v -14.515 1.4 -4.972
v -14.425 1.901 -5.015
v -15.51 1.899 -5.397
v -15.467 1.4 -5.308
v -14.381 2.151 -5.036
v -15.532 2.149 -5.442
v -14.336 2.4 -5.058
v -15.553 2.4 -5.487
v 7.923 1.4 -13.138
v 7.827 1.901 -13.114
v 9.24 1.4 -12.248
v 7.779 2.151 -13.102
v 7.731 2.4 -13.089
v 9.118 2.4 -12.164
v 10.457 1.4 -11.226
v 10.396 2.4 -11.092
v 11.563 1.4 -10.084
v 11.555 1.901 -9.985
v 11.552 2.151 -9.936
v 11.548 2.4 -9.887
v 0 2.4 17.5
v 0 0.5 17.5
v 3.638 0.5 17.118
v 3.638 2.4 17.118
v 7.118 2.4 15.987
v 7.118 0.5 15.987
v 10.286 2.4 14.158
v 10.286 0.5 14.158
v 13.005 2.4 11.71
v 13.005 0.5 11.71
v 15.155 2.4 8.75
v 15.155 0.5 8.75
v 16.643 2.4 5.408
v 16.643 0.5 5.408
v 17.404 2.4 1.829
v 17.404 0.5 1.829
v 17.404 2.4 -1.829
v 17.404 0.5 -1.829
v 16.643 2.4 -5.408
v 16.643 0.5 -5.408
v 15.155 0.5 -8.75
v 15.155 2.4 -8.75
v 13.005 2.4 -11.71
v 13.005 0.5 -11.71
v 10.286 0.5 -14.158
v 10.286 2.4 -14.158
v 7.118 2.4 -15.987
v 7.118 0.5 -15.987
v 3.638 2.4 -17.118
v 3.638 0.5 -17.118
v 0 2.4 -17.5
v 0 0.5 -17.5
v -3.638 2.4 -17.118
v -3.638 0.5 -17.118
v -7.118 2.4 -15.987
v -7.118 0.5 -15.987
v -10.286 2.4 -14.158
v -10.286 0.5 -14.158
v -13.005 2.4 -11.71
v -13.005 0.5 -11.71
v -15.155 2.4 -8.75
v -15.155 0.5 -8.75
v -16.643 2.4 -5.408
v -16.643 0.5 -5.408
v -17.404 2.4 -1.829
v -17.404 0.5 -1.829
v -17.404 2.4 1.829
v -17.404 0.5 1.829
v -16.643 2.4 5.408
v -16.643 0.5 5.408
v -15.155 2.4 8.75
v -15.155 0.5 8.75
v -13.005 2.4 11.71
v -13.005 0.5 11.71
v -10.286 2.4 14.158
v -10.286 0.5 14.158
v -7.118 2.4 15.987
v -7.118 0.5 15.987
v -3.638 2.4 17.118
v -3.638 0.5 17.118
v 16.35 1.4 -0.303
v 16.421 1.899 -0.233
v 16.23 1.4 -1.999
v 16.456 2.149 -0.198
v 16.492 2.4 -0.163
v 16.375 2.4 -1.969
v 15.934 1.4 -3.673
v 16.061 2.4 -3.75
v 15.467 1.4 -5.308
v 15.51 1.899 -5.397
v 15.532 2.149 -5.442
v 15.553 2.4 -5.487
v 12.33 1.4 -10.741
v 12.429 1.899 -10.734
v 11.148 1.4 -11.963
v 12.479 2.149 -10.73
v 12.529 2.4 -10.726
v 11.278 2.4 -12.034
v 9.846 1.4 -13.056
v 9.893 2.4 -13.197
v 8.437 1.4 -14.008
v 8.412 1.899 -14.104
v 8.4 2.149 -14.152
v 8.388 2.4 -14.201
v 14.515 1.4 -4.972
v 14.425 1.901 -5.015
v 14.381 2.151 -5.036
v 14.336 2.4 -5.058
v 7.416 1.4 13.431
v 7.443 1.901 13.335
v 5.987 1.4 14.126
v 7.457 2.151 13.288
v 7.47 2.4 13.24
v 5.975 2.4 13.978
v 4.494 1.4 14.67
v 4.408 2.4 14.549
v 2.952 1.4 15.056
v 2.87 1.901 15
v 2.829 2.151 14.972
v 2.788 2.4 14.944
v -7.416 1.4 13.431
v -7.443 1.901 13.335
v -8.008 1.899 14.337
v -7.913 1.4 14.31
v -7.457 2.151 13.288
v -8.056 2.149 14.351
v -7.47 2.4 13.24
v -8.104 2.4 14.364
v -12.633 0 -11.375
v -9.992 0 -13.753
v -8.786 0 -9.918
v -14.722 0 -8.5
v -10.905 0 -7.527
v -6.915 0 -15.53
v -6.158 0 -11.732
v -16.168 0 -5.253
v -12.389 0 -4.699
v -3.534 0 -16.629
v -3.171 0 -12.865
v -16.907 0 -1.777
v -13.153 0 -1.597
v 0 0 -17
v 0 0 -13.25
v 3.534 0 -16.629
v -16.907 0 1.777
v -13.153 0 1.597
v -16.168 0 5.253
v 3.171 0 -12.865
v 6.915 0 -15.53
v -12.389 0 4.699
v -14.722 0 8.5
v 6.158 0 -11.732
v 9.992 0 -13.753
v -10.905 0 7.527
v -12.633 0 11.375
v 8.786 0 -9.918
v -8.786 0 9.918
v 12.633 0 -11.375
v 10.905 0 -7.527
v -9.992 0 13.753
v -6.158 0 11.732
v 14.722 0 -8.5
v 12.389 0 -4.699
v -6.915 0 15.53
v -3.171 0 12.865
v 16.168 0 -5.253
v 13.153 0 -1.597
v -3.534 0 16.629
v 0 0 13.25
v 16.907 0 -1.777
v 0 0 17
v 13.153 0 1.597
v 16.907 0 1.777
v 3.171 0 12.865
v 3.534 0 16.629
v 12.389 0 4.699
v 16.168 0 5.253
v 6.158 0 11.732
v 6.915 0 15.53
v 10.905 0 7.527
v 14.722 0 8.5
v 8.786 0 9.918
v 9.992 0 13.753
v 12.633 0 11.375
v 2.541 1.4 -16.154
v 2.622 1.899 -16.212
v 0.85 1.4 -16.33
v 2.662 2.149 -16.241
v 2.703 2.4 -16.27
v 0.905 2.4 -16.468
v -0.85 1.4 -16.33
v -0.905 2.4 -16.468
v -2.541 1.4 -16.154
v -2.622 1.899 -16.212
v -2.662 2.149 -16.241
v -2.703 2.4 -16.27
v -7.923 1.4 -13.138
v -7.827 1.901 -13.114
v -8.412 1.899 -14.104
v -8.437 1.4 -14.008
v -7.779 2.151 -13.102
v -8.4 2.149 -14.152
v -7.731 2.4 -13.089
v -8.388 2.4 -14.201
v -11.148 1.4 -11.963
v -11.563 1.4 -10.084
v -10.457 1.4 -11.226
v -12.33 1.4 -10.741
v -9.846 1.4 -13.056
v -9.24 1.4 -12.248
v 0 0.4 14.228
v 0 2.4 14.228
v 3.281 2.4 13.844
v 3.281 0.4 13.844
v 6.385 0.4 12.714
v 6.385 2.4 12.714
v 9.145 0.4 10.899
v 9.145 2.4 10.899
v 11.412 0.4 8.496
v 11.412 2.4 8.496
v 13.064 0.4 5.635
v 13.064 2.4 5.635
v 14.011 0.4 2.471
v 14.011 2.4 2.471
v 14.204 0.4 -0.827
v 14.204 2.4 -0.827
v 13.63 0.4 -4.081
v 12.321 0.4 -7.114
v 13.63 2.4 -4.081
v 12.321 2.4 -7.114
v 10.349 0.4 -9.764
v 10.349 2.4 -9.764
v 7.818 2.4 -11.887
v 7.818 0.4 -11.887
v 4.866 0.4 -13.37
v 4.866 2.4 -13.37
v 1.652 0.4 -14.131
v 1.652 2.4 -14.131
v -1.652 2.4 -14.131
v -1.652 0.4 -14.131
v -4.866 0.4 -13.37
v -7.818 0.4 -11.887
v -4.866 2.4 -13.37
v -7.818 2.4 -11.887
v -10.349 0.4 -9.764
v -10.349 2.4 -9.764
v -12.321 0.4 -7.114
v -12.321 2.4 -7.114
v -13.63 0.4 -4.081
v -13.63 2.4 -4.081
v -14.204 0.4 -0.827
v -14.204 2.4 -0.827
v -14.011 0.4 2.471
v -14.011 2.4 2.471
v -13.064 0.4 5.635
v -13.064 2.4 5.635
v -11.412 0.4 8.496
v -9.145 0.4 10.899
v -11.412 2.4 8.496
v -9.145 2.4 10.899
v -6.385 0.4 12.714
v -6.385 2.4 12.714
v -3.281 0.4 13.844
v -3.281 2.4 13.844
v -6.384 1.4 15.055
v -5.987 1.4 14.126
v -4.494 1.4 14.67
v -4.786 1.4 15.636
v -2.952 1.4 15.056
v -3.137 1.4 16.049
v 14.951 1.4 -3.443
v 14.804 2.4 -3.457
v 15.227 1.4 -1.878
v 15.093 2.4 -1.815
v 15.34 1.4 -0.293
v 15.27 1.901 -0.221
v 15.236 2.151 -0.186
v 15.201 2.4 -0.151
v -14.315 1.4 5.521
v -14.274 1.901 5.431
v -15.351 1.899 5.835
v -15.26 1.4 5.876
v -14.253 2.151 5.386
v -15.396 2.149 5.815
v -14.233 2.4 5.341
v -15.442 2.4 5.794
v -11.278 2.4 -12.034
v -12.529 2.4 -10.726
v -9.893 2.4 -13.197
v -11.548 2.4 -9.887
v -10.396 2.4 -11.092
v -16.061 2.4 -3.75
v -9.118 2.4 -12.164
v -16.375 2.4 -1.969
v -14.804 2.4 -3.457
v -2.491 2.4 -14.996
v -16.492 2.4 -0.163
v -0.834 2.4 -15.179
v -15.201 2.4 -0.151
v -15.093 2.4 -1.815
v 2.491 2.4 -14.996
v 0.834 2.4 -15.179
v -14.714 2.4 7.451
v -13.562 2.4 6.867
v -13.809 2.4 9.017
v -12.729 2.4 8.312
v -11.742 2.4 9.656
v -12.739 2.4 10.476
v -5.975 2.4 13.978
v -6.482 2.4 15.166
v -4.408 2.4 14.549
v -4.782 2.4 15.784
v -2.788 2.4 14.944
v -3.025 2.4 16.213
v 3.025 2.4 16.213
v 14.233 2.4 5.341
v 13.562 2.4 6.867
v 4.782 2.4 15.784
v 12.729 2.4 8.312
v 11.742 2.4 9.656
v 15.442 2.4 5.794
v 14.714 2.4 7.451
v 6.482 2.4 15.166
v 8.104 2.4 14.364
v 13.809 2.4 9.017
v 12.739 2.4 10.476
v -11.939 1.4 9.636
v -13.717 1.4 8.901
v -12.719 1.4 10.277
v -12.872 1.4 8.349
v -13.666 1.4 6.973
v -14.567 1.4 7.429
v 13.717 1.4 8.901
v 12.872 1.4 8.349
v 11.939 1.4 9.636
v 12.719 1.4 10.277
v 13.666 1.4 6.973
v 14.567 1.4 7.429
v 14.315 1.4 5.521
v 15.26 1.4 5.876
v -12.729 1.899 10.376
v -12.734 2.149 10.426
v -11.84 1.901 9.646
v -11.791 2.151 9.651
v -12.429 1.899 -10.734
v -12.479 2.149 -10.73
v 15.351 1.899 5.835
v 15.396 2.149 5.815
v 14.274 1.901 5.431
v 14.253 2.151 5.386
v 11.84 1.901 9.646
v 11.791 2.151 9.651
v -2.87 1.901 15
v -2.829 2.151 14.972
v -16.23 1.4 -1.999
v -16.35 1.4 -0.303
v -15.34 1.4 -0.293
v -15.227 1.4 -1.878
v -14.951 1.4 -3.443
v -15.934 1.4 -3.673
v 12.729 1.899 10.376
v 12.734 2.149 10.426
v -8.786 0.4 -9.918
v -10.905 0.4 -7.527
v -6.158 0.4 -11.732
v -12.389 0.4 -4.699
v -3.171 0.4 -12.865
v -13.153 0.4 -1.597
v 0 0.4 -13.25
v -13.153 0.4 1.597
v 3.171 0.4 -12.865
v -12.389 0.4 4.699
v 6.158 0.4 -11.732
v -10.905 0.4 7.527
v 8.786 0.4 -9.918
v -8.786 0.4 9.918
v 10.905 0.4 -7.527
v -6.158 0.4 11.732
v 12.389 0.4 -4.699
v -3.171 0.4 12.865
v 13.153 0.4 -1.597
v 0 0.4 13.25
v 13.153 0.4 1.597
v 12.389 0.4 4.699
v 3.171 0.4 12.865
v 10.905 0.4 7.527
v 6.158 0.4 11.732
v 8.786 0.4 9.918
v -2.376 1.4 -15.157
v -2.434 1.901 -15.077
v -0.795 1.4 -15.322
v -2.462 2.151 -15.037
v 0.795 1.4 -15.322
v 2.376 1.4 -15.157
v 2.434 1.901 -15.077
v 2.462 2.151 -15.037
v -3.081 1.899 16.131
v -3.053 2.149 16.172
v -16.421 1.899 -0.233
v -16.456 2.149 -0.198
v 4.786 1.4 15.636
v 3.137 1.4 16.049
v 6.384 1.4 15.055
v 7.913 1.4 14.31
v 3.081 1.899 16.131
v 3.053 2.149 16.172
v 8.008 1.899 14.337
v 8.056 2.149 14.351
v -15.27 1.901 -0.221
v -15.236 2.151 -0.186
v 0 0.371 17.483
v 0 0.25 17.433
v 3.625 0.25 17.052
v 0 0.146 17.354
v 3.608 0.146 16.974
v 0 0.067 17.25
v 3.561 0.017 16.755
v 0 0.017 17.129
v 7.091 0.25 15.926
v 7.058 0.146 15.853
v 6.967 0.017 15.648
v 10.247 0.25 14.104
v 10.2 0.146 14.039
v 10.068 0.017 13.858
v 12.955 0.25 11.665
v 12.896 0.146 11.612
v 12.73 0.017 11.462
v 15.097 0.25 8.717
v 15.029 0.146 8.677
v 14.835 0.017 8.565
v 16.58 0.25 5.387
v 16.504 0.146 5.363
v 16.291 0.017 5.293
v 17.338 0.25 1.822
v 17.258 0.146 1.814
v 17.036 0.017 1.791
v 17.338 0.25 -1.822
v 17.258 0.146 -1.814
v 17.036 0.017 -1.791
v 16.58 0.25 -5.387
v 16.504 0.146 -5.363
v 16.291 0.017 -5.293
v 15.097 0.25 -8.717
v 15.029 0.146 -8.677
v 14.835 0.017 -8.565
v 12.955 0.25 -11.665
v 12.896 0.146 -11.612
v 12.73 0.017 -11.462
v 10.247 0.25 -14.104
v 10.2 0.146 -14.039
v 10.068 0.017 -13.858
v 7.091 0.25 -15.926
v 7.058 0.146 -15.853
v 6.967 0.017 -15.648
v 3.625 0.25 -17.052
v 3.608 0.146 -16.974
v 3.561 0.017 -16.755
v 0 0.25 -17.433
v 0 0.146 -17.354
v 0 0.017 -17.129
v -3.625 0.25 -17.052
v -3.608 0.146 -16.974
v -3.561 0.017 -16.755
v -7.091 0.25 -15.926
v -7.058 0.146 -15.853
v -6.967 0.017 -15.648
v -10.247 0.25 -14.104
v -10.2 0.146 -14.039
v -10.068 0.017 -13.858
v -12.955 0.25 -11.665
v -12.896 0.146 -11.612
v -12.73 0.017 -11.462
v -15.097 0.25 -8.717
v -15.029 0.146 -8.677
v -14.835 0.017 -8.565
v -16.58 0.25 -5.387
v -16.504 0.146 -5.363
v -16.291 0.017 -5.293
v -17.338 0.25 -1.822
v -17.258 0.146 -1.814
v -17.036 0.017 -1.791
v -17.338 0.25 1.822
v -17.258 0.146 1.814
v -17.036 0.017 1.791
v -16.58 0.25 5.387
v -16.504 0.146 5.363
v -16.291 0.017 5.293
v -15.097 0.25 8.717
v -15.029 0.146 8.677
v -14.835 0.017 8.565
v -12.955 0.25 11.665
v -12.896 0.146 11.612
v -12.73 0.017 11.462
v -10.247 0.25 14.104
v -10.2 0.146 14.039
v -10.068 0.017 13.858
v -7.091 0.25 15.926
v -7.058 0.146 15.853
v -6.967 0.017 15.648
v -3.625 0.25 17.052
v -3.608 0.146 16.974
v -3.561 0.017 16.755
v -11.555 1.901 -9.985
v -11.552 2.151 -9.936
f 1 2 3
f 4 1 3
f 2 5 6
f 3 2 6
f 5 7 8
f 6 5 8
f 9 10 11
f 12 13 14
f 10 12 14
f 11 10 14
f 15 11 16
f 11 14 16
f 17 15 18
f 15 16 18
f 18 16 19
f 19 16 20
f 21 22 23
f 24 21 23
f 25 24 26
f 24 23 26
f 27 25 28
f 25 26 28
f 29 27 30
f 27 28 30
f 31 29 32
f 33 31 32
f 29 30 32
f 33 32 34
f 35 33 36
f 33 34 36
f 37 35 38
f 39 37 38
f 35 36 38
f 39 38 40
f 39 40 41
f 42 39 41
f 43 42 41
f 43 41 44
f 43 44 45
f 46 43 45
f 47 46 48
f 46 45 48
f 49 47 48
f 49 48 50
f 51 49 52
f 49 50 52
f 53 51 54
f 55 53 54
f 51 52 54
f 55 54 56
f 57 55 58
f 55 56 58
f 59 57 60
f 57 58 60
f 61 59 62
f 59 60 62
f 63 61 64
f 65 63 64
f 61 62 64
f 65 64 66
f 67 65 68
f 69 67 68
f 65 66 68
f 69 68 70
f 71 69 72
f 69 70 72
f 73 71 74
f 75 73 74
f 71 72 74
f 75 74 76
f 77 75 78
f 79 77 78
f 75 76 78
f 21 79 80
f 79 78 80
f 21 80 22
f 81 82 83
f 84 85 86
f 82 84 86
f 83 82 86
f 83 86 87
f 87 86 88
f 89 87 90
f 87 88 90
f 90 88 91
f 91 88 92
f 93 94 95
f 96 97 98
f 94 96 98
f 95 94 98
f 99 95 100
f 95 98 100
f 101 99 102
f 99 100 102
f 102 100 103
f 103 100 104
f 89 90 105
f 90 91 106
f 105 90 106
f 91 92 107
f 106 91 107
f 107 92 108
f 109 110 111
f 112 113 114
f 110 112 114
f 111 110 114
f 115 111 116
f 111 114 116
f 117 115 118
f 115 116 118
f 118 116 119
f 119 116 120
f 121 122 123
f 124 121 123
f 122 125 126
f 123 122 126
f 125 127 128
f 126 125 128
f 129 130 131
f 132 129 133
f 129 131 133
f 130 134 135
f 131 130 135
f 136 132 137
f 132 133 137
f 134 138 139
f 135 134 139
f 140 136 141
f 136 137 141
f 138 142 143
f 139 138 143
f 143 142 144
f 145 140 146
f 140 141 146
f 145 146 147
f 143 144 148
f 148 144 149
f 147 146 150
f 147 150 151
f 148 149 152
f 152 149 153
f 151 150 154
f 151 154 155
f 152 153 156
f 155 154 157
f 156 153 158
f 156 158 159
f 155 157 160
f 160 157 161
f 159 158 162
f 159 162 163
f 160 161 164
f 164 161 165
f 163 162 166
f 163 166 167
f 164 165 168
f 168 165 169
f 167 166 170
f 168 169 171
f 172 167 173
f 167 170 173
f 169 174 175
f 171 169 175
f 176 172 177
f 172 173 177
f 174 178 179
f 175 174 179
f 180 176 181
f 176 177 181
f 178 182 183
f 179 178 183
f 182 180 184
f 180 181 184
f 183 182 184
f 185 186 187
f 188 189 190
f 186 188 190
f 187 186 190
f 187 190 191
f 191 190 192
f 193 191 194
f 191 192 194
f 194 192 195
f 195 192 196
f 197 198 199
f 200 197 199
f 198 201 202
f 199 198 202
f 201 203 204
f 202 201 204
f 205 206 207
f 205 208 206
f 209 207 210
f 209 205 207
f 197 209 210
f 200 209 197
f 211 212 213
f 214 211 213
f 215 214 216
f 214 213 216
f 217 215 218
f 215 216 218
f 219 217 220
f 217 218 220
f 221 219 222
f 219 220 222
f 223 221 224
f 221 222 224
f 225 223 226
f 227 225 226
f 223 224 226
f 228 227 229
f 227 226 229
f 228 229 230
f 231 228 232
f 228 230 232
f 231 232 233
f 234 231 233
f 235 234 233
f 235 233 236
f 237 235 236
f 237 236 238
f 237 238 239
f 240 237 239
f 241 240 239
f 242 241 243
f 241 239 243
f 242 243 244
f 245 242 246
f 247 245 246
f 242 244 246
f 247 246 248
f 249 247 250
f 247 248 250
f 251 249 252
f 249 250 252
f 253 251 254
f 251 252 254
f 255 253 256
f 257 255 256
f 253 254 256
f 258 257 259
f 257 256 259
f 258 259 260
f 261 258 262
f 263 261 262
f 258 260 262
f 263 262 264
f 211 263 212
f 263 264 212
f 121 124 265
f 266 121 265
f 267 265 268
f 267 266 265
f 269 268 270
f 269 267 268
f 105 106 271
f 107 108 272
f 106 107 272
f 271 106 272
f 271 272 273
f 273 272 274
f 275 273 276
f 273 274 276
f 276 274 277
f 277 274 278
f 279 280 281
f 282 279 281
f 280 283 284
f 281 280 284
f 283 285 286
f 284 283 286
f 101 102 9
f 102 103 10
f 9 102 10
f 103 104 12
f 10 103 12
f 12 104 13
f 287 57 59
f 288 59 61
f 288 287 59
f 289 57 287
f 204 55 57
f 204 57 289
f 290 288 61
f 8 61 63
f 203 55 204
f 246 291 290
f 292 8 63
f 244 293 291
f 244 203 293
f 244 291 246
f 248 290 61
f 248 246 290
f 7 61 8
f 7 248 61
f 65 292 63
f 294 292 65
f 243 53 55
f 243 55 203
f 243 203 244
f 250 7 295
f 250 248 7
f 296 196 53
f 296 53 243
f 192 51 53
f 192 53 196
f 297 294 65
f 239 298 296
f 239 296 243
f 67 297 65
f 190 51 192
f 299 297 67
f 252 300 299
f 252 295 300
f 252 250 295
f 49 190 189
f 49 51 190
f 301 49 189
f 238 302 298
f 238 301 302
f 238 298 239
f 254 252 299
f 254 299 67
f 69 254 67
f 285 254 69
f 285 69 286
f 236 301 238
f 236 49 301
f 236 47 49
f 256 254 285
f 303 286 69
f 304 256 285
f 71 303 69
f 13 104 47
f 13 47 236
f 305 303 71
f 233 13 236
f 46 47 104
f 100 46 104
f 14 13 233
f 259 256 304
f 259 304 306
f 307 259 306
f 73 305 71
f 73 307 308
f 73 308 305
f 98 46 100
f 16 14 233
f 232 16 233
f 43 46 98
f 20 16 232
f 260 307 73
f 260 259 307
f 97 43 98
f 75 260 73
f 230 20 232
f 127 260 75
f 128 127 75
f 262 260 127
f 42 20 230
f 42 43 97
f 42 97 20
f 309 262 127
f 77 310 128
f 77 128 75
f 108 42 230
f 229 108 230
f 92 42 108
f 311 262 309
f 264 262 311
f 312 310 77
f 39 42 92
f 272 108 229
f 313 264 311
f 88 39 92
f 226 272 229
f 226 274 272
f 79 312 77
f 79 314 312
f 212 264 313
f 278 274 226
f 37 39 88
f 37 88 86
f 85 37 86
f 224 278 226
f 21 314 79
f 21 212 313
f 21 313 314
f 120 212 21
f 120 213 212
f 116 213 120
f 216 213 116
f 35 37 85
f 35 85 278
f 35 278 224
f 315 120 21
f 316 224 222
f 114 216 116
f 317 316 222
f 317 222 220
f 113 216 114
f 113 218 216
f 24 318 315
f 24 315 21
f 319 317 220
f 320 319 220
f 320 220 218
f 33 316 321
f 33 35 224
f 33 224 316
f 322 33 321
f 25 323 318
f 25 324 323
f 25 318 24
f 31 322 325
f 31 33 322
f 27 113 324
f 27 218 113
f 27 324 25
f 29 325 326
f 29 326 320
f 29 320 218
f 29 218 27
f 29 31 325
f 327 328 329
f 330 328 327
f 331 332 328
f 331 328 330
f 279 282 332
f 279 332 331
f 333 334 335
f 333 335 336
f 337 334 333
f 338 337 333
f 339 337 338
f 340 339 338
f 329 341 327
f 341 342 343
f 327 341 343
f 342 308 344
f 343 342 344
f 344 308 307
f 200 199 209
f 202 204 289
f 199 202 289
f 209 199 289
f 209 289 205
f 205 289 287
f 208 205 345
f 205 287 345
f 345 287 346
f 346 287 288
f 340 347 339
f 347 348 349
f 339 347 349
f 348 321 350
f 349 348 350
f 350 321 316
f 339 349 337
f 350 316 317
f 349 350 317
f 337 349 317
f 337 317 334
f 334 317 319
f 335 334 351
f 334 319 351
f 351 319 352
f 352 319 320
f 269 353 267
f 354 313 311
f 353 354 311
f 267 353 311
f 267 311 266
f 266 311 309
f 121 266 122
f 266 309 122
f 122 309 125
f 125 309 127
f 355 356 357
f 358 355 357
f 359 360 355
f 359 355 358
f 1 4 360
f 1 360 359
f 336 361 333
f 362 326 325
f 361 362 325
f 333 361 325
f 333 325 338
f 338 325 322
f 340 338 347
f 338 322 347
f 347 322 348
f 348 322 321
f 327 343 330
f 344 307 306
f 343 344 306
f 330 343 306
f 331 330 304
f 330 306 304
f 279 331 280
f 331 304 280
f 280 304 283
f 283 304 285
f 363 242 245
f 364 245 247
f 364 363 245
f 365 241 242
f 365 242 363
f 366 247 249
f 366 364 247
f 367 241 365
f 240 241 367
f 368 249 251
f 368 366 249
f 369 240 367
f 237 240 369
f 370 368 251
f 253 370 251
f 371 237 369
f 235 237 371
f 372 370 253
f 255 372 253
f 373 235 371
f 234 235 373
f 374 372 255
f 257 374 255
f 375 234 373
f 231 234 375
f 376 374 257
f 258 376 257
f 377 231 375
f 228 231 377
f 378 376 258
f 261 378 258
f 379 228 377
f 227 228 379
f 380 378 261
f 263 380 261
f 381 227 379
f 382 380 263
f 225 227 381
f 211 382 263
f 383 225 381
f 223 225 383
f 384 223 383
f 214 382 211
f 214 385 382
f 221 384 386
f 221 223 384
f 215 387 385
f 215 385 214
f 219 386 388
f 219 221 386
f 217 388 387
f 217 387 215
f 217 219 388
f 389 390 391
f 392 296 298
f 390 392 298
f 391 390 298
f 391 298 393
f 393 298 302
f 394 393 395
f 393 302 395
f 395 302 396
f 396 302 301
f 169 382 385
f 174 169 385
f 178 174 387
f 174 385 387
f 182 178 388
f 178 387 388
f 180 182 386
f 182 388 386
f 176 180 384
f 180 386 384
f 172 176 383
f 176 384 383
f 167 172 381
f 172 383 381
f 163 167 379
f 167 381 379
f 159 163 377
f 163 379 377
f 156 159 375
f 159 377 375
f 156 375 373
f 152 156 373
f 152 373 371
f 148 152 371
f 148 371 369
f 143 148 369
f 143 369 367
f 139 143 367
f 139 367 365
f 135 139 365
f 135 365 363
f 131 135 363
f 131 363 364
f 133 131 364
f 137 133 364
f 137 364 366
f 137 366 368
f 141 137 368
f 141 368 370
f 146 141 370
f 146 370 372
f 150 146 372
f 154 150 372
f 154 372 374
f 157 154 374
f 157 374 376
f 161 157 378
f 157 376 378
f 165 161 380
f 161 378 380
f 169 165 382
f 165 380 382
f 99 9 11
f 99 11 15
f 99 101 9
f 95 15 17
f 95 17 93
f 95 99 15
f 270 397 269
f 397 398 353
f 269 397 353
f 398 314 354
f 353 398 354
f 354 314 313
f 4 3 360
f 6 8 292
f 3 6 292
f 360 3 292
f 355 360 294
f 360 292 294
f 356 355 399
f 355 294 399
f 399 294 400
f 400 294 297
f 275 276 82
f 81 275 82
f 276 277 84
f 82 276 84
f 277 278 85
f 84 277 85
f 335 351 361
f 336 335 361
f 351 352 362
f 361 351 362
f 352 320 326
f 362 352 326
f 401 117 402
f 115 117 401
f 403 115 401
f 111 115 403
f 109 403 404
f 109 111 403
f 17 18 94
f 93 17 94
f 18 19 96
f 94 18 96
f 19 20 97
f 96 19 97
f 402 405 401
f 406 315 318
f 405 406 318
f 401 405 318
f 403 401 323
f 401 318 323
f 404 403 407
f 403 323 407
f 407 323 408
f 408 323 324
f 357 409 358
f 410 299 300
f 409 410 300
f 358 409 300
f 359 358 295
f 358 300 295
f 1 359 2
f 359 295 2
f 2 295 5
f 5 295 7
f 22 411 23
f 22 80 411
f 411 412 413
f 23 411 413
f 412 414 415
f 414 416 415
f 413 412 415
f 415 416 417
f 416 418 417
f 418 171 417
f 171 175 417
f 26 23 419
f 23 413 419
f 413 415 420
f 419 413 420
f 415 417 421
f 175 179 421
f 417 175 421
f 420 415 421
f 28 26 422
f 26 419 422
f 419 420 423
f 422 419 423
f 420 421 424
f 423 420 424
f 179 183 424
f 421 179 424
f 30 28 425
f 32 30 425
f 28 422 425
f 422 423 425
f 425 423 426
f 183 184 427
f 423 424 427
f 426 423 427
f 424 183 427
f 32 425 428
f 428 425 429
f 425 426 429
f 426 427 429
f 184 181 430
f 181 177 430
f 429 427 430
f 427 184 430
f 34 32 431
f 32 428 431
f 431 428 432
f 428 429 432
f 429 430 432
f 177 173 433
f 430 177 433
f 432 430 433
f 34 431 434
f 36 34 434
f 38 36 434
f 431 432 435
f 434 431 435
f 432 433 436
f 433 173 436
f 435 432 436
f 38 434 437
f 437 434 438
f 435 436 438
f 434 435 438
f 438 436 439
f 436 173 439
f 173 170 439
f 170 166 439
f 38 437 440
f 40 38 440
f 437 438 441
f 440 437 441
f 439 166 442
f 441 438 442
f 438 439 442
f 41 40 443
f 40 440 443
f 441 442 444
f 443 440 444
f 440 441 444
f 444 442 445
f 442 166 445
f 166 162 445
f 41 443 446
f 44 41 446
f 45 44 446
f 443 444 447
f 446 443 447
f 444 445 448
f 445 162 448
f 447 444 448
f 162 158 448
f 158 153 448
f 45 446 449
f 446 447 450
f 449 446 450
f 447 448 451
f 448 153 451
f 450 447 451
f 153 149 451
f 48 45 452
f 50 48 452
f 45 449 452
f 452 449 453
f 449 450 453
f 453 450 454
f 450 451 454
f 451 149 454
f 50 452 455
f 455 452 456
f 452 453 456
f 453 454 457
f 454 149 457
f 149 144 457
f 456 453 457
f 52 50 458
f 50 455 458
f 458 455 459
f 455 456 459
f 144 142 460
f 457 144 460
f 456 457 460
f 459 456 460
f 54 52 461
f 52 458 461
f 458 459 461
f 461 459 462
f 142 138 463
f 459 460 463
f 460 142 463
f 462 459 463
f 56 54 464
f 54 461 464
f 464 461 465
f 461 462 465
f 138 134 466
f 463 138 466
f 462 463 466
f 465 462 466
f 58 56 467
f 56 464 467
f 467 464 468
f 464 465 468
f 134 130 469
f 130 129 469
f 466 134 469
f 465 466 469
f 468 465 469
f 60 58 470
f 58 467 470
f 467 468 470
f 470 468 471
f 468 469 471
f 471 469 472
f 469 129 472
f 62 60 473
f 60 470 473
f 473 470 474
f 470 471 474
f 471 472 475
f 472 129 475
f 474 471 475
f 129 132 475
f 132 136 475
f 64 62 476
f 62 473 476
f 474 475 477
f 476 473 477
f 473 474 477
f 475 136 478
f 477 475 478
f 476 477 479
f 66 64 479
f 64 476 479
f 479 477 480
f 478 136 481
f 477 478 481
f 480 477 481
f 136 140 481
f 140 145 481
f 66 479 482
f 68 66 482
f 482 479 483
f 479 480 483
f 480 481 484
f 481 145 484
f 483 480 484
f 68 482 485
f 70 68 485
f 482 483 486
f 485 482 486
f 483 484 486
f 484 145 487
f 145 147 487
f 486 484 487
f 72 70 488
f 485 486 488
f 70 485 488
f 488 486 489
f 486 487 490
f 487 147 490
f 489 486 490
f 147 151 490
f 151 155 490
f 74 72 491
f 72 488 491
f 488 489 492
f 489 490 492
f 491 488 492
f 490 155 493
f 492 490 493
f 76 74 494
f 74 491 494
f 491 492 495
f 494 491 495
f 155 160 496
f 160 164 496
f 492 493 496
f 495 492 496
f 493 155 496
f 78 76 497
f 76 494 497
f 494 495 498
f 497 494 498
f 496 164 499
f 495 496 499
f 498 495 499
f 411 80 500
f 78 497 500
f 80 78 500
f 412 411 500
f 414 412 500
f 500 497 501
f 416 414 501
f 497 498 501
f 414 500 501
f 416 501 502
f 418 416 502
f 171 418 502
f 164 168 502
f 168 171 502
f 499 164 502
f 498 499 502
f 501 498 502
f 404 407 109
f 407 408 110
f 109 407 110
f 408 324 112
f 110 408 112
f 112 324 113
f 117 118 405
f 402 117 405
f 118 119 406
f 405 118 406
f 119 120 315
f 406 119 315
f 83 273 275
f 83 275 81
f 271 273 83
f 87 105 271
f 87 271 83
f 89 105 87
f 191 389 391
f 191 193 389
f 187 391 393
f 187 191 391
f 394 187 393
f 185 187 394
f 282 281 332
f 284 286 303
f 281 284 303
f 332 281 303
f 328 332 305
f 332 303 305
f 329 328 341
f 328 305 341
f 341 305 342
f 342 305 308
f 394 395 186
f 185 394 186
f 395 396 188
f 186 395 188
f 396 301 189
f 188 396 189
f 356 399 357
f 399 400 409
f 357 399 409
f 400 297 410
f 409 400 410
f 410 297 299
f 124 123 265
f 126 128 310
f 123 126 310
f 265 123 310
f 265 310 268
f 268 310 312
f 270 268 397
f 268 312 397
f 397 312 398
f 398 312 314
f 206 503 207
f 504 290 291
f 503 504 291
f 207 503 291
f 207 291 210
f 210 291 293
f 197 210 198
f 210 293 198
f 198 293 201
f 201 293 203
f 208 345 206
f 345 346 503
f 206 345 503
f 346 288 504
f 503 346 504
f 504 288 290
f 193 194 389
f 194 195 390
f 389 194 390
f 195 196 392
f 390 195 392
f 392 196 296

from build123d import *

# Parameters (mm, degrees)
SKETCH_1_R                    = 17.5
SKETCH_1_R_2                  = 13
EXTRUDE_1_DEPTH               = 2.4
SKETCH_2_R                    = 14.227604949
CUT_EXTRUDE_1_DEPTH           = 2
SKETCH_3_R                    = 13.25
CUT_EXTRUDE_2_DEPTH           = 2
CUT_EXTRUDE_3_DEPTH           = 1
CUT_EXTRUDE_3_DRAFT           = -8
CUT_EXTRUDE_3_PROFILE_2_DEPTH = 1
CUT_EXTRUDE_3_PROFILE_2_DRAFT = -8
CUT_EXTRUDE_3_PROFILE_3_DEPTH = 1
CUT_EXTRUDE_3_PROFILE_3_DRAFT = -8
CUT_EXTRUDE_3_PROFILE_4_DEPTH = 1
CUT_EXTRUDE_3_PROFILE_4_DRAFT = -8
CUT_EXTRUDE_3_PROFILE_5_DEPTH = 1
CUT_EXTRUDE_3_PROFILE_5_DRAFT = -8
CUT_EXTRUDE_3_PROFILE_6_DEPTH = 1
CUT_EXTRUDE_3_PROFILE_6_DRAFT = -8
CUT_EXTRUDE_3_PROFILE_7_DEPTH = 1
CUT_EXTRUDE_3_PROFILE_7_DRAFT = -8
CUT_EXTRUDE_3_PROFILE_8_DEPTH = 1
CUT_EXTRUDE_3_PROFILE_8_DRAFT = -8
CUT_EXTRUDE_3_PROFILE_9_DEPTH = 1
CUT_EXTRUDE_3_PROFILE_9_DRAFT = -8
FILLET_1_R                    = 0.5


with BuildPart() as part:
    # 草图1 → 凸台-拉伸1 (new body)
    with BuildSketch(Plane(origin=(0, 0, 0), x_dir=(1, 0, 0), z_dir=(0, 1, 0))):
        with Locations(Location((0, 0, 0), (0, 0, 270))):
            Circle(SKETCH_1_R)
        with Locations(Location((0, 0, 0), (0, 0, 270))):
            Circle(SKETCH_1_R_2, mode=Mode.SUBTRACT)
    extrude(amount=EXTRUDE_1_DEPTH)

    # 草图2 → 切除-拉伸1 (cut)
    with BuildSketch(Plane(origin=(0, 2.4, 0), x_dir=(1, 0, 0), z_dir=(0, 1, 0))):
        with Locations(Location((0, 0, 0), (0, 0, 270))):
            Circle(SKETCH_2_R)
    extrude(amount=-CUT_EXTRUDE_1_DEPTH, mode=Mode.SUBTRACT)

    # 草图3 → 切除-拉伸2 (cut)
    with BuildSketch(Plane(origin=(0, 0.4, 0), x_dir=(1, 0, 0), z_dir=(0, 1, 0))):
        with Locations(Location((0, 0, 0), (0, 0, 270))):
            Circle(SKETCH_3_R)
    extrude(amount=-CUT_EXTRUDE_2_DEPTH, mode=Mode.SUBTRACT)


with BuildPart() as cut_extrude_3_tool:
    # 草图4 → 切除-拉伸3 (with draft: the straight prism first)
    with BuildSketch(Plane(origin=(0, 2.4, 0), x_dir=(1, 0, 0), z_dir=(0, 1, 0))):
        with BuildLine():
            ThreePointArc((-2.491276454, 14.996396377), (0, 15.201919703), (2.491276454, 14.996396377))
            Line((2.491276454, 14.996396377), (2.702833077, 16.269874865))
            ThreePointArc((2.702833077, 16.269874865), (0, 16.49285102), (-2.702833077, 16.269874865))
            Line((-2.702833077, 16.269874865), (-2.491276454, 14.996396377))
        make_face()
    extrude(amount=-CUT_EXTRUDE_3_DEPTH)
    # 切除-拉伸3: the draft: its side faces are tilted about the plane it starts from
    cut_extrude_3_sides = [cut_extrude_3_tool.faces().sort_by_distance(p)[0] for p in [
        (0, 1.9, -16.49285102),
        (-2.597054766, 1.9, -15.633135621),
        (0, 1.9, -15.201919703),
        (2.597054766, 1.9, -15.633135621),
    ]]
    draft(cut_extrude_3_sides, Plane(origin=(0, 2.4, 0), x_dir=(1, 0, 0), z_dir=(0, 1, 0)), CUT_EXTRUDE_3_DRAFT)


with BuildPart() as part_1:
    add(part.part)

    # 切除-拉伸3: cut by cut_extrude_3_tool
    add(cut_extrude_3_tool.part, mode=Mode.SUBTRACT)


with BuildPart() as cut_extrude_3_profile_2_tool:
    # 草图4 → 切除-拉伸3 profile 2 (with draft: the straight prism first)
    with BuildSketch(Plane(origin=(0, 2.4, 0), x_dir=(1, 0, 0), z_dir=(0, 1, 0))):
        with BuildLine():
            ThreePointArc((7.731069297, 13.089267749), (9.771605629, 11.645346113), (11.547926265, 9.886544474))
            Line((11.547926265, 9.886544474), (12.528564234, 10.726099617))
            ThreePointArc((12.528564234, 10.726099617), (10.601400284, 12.634256875), (8.387583715, 14.200794844))
            Line((8.387583715, 14.200794844), (7.731069297, 13.089267749))
        make_face()
    extrude(amount=-CUT_EXTRUDE_3_PROFILE_2_DEPTH)
    # 切除-拉伸3 profile 2: the draft: its side faces are tilted about the plane it starts from
    cut_extrude_3_profile_2_sides = [cut_extrude_3_profile_2_tool.faces().sort_by_distance(p)[0] for p in [
        (8.059326506, 1.9, -13.645031296),
        (9.771605629, 1.9, -11.645346113),
        (12.03824525, 1.9, -10.306322046),
        (10.601400284, 1.9, -12.634256875),
    ]]
    draft(cut_extrude_3_profile_2_sides, Plane(origin=(0, 2.4, 0), x_dir=(1, 0, 0), z_dir=(0, 1, 0)), CUT_EXTRUDE_3_PROFILE_2_DRAFT)


with BuildPart() as part_2:
    add(part_1.part)

    # 切除-拉伸3 profile 2: cut by cut_extrude_3_profile_2_tool
    add(cut_extrude_3_profile_2_tool.part, mode=Mode.SUBTRACT)


with BuildPart() as cut_extrude_3_profile_3_tool:
    # 草图4 → 切除-拉伸3 profile 3 (with draft: the straight prism first)
    with BuildSketch(Plane(origin=(0, 2.4, 0), x_dir=(1, 0, 0), z_dir=(0, 1, 0))):
        with BuildLine():
            ThreePointArc((14.335961803, 5.05752527), (14.970968385, 2.639785654), (15.201173036, 0.150668535))
            Line((15.201173036, 0.150668535), (16.492040946, 0.163463152))
            ThreePointArc((16.492040946, 0.163463152), (16.242287554, 2.863953524), (15.553356869, 5.487005091))
            Line((15.553356869, 5.487005091), (14.335961803, 5.05752527))
        make_face()
    extrude(amount=-CUT_EXTRUDE_3_PROFILE_3_DEPTH)
    # 切除-拉伸3 profile 3: the draft: its side faces are tilted about the plane it starts from
    cut_extrude_3_profile_3_sides = [cut_extrude_3_profile_3_tool.faces().sort_by_distance(p)[0] for p in [
        (14.970968385, 1.9, -2.639785654),
        (15.846606991, 1.9, -0.157065843),
        (16.242287554, 1.9, -2.863953524),
        (14.944659336, 1.9, -5.27226518),
    ]]
    draft(cut_extrude_3_profile_3_sides, Plane(origin=(0, 2.4, 0), x_dir=(1, 0, 0), z_dir=(0, 1, 0)), CUT_EXTRUDE_3_PROFILE_3_DRAFT)


with BuildPart() as part_3:
    add(part_2.part)

    # 切除-拉伸3 profile 3: cut by cut_extrude_3_profile_3_tool
    add(cut_extrude_3_profile_3_tool.part, mode=Mode.SUBTRACT)


with BuildPart() as cut_extrude_3_profile_4_tool:
    # 草图4 → 切除-拉伸3 profile 4 (with draft: the straight prism first)
    with BuildSketch(Plane(origin=(0, 2.4, 0), x_dir=(1, 0, 0), z_dir=(0, 1, 0))):
        with BuildLine():
            ThreePointArc((14.232898455, -5.340689491), (13.165248649, -7.600959852), (11.741622, -9.655706886))
            Line((11.741622, -9.655706886), (12.738708411, -10.47565954))
            ThreePointArc((12.738708411, -10.47565954), (14.283227964, -8.24642551), (15.441541488, -5.794215325))
            Line((15.441541488, -5.794215325), (14.232898455, -5.340689491))
        make_face()
    extrude(amount=-CUT_EXTRUDE_3_PROFILE_4_DEPTH)
    # 切除-拉伸3 profile 4: the draft: its side faces are tilted about the plane it starts from
    cut_extrude_3_profile_4_sides = [cut_extrude_3_profile_4_tool.faces().sort_by_distance(p)[0] for p in [
        (12.240165206, 1.9, 10.065683213),
        (14.283227964, 1.9, 8.24642551),
        (14.837219972, 1.9, 5.567452408),
        (13.165248649, 1.9, 7.600959852),
    ]]
    draft(cut_extrude_3_profile_4_sides, Plane(origin=(0, 2.4, 0), x_dir=(1, 0, 0), z_dir=(0, 1, 0)), CUT_EXTRUDE_3_PROFILE_4_DRAFT)


with BuildPart() as part_4:
    add(part_3.part)

    # 切除-拉伸3 profile 4: cut by cut_extrude_3_profile_4_tool
    add(cut_extrude_3_profile_4_tool.part, mode=Mode.SUBTRACT)


with BuildPart() as cut_extrude_3_profile_5_tool:
    # 草图4 → 切除-拉伸3 profile 5 (with draft: the straight prism first)
    with BuildSketch(Plane(origin=(0, 2.4, 0), x_dir=(1, 0, 0), z_dir=(0, 1, 0))):
        with BuildLine():
            ThreePointArc((7.470103739, -13.239936284), (5.199362756, -14.285131767), (2.788035538, -14.944069744))
            Line((2.788035538, -14.944069744), (3.024792635, -16.213104708))
            ThreePointArc((3.024792635, -16.213104708), (5.64088727, -15.498210399), (8.104457231, -14.364257995))
            Line((8.104457231, -14.364257995), (7.470103739, -13.239936284))
        make_face()
    extrude(amount=-CUT_EXTRUDE_3_PROFILE_5_DEPTH)
    # 切除-拉伸3 profile 5: the draft: its side faces are tilted about the plane it starts from
    cut_extrude_3_profile_5_sides = [cut_extrude_3_profile_5_tool.faces().sort_by_distance(p)[0] for p in [
        (5.199362756, 1.9, 14.285131767),
        (2.906414086, 1.9, 15.578587226),
        (5.64088727, 1.9, 15.498210399),
        (7.787280485, 1.9, 13.80209714),
    ]]
    draft(cut_extrude_3_profile_5_sides, Plane(origin=(0, 2.4, 0), x_dir=(1, 0, 0), z_dir=(0, 1, 0)), CUT_EXTRUDE_3_PROFILE_5_DRAFT)


with BuildPart() as part_5:
    add(part_4.part)

    # 切除-拉伸3 profile 5: cut by cut_extrude_3_profile_5_tool
    add(cut_extrude_3_profile_5_tool.part, mode=Mode.SUBTRACT)


with BuildPart() as cut_extrude_3_profile_6_tool:
    # 草图4 → 切除-拉伸3 profile 6 (with draft: the straight prism first)
    with BuildSketch(Plane(origin=(0, 2.4, 0), x_dir=(1, 0, 0), z_dir=(0, 1, 0))):
        with BuildLine():
            ThreePointArc((-2.788035538, -14.944069744), (-5.199362756, -14.285131767), (-7.470103739, -13.239936284))
            Line((-7.470103739, -13.239936284), (-8.104457231, -14.364257995))
            ThreePointArc((-8.104457231, -14.364257995), (-5.64088727, -15.498210399), (-3.024792635, -16.213104708))
            Line((-3.024792635, -16.213104708), (-2.788035538, -14.944069744))
        make_face()
    extrude(amount=-CUT_EXTRUDE_3_PROFILE_6_DEPTH)
    # 切除-拉伸3 profile 6: the draft: its side faces are tilted about the plane it starts from
    cut_extrude_3_profile_6_sides = [cut_extrude_3_profile_6_tool.faces().sort_by_distance(p)[0] for p in [
        (-5.64088727, 1.9, 15.498210399),
        (-2.906414086, 1.9, 15.578587226),
        (-5.199362756, 1.9, 14.285131767),
        (-7.787280485, 1.9, 13.80209714),
    ]]
    draft(cut_extrude_3_profile_6_sides, Plane(origin=(0, 2.4, 0), x_dir=(1, 0, 0), z_dir=(0, 1, 0)), CUT_EXTRUDE_3_PROFILE_6_DRAFT)


with BuildPart() as part_6:
    add(part_5.part)

    # 切除-拉伸3 profile 6: cut by cut_extrude_3_profile_6_tool
    add(cut_extrude_3_profile_6_tool.part, mode=Mode.SUBTRACT)


with BuildPart() as cut_extrude_3_profile_7_tool:
    # 草图4 → 切除-拉伸3 profile 7 (with draft: the straight prism first)
    with BuildSketch(Plane(origin=(0, 2.4, 0), x_dir=(1, 0, 0), z_dir=(0, 1, 0))):
        with BuildLine():
            ThreePointArc((-11.741622, -9.655706886), (-13.165248649, -7.600959852), (-14.232898455, -5.340689491))
            Line((-14.232898455, -5.340689491), (-15.441541488, -5.794215325))
            ThreePointArc((-15.441541488, -5.794215325), (-14.283227964, -8.24642551), (-12.738708411, -10.47565954))
            Line((-12.738708411, -10.47565954), (-11.741622, -9.655706886))
        make_face()
    extrude(amount=-CUT_EXTRUDE_3_PROFILE_7_DEPTH)
    # 切除-拉伸3 profile 7: the draft: its side faces are tilted about the plane it starts from
    cut_extrude_3_profile_7_sides = [cut_extrude_3_profile_7_tool.faces().sort_by_distance(p)[0] for p in [
        (-12.240165206, 1.9, 10.065683213),
        (-13.165248649, 1.9, 7.600959852),
        (-14.837219972, 1.9, 5.567452408),
        (-14.283227964, 1.9, 8.24642551),
    ]]
    draft(cut_extrude_3_profile_7_sides, Plane(origin=(0, 2.4, 0), x_dir=(1, 0, 0), z_dir=(0, 1, 0)), CUT_EXTRUDE_3_PROFILE_7_DRAFT)


with BuildPart() as part_7:
    add(part_6.part)

    # 切除-拉伸3 profile 7: cut by cut_extrude_3_profile_7_tool
    add(cut_extrude_3_profile_7_tool.part, mode=Mode.SUBTRACT)


with BuildPart() as cut_extrude_3_profile_8_tool:
    # 草图4 → 切除-拉伸3 profile 8 (with draft: the straight prism first)
    with BuildSketch(Plane(origin=(0, 2.4, 0), x_dir=(1, 0, 0), z_dir=(0, 1, 0))):
        with BuildLine():
            ThreePointArc((-15.201173036, 0.150668535), (-14.970968385, 2.639785654), (-14.335961803, 5.05752527))
            Line((-14.335961803, 5.05752527), (-15.553356869, 5.487005091))
            ThreePointArc((-15.553356869, 5.487005091), (-16.242287554, 2.863953524), (-16.492040946, 0.163463152))
            Line((-16.492040946, 0.163463152), (-15.201173036, 0.150668535))
        make_face()
    extrude(amount=-CUT_EXTRUDE_3_PROFILE_8_DEPTH)
    # 切除-拉伸3 profile 8: the draft: its side faces are tilted about the plane it starts from
    cut_extrude_3_profile_8_sides = [cut_extrude_3_profile_8_tool.faces().sort_by_distance(p)[0] for p in [
        (-14.944659336, 1.9, -5.27226518),
        (-16.242287554, 1.9, -2.863953524),
        (-15.846606991, 1.9, -0.157065843),
        (-14.970968385, 1.9, -2.639785654),
    ]]
    draft(cut_extrude_3_profile_8_sides, Plane(origin=(0, 2.4, 0), x_dir=(1, 0, 0), z_dir=(0, 1, 0)), CUT_EXTRUDE_3_PROFILE_8_DRAFT)


with BuildPart() as part_8:
    add(part_7.part)

    # 切除-拉伸3 profile 8: cut by cut_extrude_3_profile_8_tool
    add(cut_extrude_3_profile_8_tool.part, mode=Mode.SUBTRACT)


with BuildPart() as cut_extrude_3_profile_9_tool:
    # 草图4 → 切除-拉伸3 profile 9 (with draft: the straight prism first)
    with BuildSketch(Plane(origin=(0, 2.4, 0), x_dir=(1, 0, 0), z_dir=(0, 1, 0))):
        with BuildLine():
            ThreePointArc((-11.547926265, 9.886544474), (-9.771605629, 11.645346113), (-7.731069297, 13.089267749))
            Line((-7.731069297, 13.089267749), (-8.387583715, 14.200794844))
            ThreePointArc((-8.387583715, 14.200794844), (-10.601400284, 12.634256875), (-12.528564234, 10.726099617))
            Line((-12.528564234, 10.726099617), (-11.547926265, 9.886544474))
        make_face()
    extrude(amount=-CUT_EXTRUDE_3_PROFILE_9_DEPTH)
    # 切除-拉伸3 profile 9: the draft: its side faces are tilted about the plane it starts from
    cut_extrude_3_profile_9_sides = [cut_extrude_3_profile_9_tool.faces().sort_by_distance(p)[0] for p in [
        (-10.601400284, 1.9, -12.634256875),
        (-12.03824525, 1.9, -10.306322046),
        (-9.771605629, 1.9, -11.645346113),
        (-8.059326506, 1.9, -13.645031296),
    ]]
    draft(cut_extrude_3_profile_9_sides, Plane(origin=(0, 2.4, 0), x_dir=(1, 0, 0), z_dir=(0, 1, 0)), CUT_EXTRUDE_3_PROFILE_9_DRAFT)


with BuildPart() as part_9:
    add(part_8.part)

    # 切除-拉伸3 profile 9: cut by cut_extrude_3_profile_9_tool
    add(cut_extrude_3_profile_9_tool.part, mode=Mode.SUBTRACT)

    # 圆角1
    fillet_1_edges = [part_9.edges().sort_by_distance(p)[0] for p in [
        (0, 0, -17.5),
    ]]
    fillet(fillet_1_edges, radius=FILLET_1_R)


solid = part_9.part
